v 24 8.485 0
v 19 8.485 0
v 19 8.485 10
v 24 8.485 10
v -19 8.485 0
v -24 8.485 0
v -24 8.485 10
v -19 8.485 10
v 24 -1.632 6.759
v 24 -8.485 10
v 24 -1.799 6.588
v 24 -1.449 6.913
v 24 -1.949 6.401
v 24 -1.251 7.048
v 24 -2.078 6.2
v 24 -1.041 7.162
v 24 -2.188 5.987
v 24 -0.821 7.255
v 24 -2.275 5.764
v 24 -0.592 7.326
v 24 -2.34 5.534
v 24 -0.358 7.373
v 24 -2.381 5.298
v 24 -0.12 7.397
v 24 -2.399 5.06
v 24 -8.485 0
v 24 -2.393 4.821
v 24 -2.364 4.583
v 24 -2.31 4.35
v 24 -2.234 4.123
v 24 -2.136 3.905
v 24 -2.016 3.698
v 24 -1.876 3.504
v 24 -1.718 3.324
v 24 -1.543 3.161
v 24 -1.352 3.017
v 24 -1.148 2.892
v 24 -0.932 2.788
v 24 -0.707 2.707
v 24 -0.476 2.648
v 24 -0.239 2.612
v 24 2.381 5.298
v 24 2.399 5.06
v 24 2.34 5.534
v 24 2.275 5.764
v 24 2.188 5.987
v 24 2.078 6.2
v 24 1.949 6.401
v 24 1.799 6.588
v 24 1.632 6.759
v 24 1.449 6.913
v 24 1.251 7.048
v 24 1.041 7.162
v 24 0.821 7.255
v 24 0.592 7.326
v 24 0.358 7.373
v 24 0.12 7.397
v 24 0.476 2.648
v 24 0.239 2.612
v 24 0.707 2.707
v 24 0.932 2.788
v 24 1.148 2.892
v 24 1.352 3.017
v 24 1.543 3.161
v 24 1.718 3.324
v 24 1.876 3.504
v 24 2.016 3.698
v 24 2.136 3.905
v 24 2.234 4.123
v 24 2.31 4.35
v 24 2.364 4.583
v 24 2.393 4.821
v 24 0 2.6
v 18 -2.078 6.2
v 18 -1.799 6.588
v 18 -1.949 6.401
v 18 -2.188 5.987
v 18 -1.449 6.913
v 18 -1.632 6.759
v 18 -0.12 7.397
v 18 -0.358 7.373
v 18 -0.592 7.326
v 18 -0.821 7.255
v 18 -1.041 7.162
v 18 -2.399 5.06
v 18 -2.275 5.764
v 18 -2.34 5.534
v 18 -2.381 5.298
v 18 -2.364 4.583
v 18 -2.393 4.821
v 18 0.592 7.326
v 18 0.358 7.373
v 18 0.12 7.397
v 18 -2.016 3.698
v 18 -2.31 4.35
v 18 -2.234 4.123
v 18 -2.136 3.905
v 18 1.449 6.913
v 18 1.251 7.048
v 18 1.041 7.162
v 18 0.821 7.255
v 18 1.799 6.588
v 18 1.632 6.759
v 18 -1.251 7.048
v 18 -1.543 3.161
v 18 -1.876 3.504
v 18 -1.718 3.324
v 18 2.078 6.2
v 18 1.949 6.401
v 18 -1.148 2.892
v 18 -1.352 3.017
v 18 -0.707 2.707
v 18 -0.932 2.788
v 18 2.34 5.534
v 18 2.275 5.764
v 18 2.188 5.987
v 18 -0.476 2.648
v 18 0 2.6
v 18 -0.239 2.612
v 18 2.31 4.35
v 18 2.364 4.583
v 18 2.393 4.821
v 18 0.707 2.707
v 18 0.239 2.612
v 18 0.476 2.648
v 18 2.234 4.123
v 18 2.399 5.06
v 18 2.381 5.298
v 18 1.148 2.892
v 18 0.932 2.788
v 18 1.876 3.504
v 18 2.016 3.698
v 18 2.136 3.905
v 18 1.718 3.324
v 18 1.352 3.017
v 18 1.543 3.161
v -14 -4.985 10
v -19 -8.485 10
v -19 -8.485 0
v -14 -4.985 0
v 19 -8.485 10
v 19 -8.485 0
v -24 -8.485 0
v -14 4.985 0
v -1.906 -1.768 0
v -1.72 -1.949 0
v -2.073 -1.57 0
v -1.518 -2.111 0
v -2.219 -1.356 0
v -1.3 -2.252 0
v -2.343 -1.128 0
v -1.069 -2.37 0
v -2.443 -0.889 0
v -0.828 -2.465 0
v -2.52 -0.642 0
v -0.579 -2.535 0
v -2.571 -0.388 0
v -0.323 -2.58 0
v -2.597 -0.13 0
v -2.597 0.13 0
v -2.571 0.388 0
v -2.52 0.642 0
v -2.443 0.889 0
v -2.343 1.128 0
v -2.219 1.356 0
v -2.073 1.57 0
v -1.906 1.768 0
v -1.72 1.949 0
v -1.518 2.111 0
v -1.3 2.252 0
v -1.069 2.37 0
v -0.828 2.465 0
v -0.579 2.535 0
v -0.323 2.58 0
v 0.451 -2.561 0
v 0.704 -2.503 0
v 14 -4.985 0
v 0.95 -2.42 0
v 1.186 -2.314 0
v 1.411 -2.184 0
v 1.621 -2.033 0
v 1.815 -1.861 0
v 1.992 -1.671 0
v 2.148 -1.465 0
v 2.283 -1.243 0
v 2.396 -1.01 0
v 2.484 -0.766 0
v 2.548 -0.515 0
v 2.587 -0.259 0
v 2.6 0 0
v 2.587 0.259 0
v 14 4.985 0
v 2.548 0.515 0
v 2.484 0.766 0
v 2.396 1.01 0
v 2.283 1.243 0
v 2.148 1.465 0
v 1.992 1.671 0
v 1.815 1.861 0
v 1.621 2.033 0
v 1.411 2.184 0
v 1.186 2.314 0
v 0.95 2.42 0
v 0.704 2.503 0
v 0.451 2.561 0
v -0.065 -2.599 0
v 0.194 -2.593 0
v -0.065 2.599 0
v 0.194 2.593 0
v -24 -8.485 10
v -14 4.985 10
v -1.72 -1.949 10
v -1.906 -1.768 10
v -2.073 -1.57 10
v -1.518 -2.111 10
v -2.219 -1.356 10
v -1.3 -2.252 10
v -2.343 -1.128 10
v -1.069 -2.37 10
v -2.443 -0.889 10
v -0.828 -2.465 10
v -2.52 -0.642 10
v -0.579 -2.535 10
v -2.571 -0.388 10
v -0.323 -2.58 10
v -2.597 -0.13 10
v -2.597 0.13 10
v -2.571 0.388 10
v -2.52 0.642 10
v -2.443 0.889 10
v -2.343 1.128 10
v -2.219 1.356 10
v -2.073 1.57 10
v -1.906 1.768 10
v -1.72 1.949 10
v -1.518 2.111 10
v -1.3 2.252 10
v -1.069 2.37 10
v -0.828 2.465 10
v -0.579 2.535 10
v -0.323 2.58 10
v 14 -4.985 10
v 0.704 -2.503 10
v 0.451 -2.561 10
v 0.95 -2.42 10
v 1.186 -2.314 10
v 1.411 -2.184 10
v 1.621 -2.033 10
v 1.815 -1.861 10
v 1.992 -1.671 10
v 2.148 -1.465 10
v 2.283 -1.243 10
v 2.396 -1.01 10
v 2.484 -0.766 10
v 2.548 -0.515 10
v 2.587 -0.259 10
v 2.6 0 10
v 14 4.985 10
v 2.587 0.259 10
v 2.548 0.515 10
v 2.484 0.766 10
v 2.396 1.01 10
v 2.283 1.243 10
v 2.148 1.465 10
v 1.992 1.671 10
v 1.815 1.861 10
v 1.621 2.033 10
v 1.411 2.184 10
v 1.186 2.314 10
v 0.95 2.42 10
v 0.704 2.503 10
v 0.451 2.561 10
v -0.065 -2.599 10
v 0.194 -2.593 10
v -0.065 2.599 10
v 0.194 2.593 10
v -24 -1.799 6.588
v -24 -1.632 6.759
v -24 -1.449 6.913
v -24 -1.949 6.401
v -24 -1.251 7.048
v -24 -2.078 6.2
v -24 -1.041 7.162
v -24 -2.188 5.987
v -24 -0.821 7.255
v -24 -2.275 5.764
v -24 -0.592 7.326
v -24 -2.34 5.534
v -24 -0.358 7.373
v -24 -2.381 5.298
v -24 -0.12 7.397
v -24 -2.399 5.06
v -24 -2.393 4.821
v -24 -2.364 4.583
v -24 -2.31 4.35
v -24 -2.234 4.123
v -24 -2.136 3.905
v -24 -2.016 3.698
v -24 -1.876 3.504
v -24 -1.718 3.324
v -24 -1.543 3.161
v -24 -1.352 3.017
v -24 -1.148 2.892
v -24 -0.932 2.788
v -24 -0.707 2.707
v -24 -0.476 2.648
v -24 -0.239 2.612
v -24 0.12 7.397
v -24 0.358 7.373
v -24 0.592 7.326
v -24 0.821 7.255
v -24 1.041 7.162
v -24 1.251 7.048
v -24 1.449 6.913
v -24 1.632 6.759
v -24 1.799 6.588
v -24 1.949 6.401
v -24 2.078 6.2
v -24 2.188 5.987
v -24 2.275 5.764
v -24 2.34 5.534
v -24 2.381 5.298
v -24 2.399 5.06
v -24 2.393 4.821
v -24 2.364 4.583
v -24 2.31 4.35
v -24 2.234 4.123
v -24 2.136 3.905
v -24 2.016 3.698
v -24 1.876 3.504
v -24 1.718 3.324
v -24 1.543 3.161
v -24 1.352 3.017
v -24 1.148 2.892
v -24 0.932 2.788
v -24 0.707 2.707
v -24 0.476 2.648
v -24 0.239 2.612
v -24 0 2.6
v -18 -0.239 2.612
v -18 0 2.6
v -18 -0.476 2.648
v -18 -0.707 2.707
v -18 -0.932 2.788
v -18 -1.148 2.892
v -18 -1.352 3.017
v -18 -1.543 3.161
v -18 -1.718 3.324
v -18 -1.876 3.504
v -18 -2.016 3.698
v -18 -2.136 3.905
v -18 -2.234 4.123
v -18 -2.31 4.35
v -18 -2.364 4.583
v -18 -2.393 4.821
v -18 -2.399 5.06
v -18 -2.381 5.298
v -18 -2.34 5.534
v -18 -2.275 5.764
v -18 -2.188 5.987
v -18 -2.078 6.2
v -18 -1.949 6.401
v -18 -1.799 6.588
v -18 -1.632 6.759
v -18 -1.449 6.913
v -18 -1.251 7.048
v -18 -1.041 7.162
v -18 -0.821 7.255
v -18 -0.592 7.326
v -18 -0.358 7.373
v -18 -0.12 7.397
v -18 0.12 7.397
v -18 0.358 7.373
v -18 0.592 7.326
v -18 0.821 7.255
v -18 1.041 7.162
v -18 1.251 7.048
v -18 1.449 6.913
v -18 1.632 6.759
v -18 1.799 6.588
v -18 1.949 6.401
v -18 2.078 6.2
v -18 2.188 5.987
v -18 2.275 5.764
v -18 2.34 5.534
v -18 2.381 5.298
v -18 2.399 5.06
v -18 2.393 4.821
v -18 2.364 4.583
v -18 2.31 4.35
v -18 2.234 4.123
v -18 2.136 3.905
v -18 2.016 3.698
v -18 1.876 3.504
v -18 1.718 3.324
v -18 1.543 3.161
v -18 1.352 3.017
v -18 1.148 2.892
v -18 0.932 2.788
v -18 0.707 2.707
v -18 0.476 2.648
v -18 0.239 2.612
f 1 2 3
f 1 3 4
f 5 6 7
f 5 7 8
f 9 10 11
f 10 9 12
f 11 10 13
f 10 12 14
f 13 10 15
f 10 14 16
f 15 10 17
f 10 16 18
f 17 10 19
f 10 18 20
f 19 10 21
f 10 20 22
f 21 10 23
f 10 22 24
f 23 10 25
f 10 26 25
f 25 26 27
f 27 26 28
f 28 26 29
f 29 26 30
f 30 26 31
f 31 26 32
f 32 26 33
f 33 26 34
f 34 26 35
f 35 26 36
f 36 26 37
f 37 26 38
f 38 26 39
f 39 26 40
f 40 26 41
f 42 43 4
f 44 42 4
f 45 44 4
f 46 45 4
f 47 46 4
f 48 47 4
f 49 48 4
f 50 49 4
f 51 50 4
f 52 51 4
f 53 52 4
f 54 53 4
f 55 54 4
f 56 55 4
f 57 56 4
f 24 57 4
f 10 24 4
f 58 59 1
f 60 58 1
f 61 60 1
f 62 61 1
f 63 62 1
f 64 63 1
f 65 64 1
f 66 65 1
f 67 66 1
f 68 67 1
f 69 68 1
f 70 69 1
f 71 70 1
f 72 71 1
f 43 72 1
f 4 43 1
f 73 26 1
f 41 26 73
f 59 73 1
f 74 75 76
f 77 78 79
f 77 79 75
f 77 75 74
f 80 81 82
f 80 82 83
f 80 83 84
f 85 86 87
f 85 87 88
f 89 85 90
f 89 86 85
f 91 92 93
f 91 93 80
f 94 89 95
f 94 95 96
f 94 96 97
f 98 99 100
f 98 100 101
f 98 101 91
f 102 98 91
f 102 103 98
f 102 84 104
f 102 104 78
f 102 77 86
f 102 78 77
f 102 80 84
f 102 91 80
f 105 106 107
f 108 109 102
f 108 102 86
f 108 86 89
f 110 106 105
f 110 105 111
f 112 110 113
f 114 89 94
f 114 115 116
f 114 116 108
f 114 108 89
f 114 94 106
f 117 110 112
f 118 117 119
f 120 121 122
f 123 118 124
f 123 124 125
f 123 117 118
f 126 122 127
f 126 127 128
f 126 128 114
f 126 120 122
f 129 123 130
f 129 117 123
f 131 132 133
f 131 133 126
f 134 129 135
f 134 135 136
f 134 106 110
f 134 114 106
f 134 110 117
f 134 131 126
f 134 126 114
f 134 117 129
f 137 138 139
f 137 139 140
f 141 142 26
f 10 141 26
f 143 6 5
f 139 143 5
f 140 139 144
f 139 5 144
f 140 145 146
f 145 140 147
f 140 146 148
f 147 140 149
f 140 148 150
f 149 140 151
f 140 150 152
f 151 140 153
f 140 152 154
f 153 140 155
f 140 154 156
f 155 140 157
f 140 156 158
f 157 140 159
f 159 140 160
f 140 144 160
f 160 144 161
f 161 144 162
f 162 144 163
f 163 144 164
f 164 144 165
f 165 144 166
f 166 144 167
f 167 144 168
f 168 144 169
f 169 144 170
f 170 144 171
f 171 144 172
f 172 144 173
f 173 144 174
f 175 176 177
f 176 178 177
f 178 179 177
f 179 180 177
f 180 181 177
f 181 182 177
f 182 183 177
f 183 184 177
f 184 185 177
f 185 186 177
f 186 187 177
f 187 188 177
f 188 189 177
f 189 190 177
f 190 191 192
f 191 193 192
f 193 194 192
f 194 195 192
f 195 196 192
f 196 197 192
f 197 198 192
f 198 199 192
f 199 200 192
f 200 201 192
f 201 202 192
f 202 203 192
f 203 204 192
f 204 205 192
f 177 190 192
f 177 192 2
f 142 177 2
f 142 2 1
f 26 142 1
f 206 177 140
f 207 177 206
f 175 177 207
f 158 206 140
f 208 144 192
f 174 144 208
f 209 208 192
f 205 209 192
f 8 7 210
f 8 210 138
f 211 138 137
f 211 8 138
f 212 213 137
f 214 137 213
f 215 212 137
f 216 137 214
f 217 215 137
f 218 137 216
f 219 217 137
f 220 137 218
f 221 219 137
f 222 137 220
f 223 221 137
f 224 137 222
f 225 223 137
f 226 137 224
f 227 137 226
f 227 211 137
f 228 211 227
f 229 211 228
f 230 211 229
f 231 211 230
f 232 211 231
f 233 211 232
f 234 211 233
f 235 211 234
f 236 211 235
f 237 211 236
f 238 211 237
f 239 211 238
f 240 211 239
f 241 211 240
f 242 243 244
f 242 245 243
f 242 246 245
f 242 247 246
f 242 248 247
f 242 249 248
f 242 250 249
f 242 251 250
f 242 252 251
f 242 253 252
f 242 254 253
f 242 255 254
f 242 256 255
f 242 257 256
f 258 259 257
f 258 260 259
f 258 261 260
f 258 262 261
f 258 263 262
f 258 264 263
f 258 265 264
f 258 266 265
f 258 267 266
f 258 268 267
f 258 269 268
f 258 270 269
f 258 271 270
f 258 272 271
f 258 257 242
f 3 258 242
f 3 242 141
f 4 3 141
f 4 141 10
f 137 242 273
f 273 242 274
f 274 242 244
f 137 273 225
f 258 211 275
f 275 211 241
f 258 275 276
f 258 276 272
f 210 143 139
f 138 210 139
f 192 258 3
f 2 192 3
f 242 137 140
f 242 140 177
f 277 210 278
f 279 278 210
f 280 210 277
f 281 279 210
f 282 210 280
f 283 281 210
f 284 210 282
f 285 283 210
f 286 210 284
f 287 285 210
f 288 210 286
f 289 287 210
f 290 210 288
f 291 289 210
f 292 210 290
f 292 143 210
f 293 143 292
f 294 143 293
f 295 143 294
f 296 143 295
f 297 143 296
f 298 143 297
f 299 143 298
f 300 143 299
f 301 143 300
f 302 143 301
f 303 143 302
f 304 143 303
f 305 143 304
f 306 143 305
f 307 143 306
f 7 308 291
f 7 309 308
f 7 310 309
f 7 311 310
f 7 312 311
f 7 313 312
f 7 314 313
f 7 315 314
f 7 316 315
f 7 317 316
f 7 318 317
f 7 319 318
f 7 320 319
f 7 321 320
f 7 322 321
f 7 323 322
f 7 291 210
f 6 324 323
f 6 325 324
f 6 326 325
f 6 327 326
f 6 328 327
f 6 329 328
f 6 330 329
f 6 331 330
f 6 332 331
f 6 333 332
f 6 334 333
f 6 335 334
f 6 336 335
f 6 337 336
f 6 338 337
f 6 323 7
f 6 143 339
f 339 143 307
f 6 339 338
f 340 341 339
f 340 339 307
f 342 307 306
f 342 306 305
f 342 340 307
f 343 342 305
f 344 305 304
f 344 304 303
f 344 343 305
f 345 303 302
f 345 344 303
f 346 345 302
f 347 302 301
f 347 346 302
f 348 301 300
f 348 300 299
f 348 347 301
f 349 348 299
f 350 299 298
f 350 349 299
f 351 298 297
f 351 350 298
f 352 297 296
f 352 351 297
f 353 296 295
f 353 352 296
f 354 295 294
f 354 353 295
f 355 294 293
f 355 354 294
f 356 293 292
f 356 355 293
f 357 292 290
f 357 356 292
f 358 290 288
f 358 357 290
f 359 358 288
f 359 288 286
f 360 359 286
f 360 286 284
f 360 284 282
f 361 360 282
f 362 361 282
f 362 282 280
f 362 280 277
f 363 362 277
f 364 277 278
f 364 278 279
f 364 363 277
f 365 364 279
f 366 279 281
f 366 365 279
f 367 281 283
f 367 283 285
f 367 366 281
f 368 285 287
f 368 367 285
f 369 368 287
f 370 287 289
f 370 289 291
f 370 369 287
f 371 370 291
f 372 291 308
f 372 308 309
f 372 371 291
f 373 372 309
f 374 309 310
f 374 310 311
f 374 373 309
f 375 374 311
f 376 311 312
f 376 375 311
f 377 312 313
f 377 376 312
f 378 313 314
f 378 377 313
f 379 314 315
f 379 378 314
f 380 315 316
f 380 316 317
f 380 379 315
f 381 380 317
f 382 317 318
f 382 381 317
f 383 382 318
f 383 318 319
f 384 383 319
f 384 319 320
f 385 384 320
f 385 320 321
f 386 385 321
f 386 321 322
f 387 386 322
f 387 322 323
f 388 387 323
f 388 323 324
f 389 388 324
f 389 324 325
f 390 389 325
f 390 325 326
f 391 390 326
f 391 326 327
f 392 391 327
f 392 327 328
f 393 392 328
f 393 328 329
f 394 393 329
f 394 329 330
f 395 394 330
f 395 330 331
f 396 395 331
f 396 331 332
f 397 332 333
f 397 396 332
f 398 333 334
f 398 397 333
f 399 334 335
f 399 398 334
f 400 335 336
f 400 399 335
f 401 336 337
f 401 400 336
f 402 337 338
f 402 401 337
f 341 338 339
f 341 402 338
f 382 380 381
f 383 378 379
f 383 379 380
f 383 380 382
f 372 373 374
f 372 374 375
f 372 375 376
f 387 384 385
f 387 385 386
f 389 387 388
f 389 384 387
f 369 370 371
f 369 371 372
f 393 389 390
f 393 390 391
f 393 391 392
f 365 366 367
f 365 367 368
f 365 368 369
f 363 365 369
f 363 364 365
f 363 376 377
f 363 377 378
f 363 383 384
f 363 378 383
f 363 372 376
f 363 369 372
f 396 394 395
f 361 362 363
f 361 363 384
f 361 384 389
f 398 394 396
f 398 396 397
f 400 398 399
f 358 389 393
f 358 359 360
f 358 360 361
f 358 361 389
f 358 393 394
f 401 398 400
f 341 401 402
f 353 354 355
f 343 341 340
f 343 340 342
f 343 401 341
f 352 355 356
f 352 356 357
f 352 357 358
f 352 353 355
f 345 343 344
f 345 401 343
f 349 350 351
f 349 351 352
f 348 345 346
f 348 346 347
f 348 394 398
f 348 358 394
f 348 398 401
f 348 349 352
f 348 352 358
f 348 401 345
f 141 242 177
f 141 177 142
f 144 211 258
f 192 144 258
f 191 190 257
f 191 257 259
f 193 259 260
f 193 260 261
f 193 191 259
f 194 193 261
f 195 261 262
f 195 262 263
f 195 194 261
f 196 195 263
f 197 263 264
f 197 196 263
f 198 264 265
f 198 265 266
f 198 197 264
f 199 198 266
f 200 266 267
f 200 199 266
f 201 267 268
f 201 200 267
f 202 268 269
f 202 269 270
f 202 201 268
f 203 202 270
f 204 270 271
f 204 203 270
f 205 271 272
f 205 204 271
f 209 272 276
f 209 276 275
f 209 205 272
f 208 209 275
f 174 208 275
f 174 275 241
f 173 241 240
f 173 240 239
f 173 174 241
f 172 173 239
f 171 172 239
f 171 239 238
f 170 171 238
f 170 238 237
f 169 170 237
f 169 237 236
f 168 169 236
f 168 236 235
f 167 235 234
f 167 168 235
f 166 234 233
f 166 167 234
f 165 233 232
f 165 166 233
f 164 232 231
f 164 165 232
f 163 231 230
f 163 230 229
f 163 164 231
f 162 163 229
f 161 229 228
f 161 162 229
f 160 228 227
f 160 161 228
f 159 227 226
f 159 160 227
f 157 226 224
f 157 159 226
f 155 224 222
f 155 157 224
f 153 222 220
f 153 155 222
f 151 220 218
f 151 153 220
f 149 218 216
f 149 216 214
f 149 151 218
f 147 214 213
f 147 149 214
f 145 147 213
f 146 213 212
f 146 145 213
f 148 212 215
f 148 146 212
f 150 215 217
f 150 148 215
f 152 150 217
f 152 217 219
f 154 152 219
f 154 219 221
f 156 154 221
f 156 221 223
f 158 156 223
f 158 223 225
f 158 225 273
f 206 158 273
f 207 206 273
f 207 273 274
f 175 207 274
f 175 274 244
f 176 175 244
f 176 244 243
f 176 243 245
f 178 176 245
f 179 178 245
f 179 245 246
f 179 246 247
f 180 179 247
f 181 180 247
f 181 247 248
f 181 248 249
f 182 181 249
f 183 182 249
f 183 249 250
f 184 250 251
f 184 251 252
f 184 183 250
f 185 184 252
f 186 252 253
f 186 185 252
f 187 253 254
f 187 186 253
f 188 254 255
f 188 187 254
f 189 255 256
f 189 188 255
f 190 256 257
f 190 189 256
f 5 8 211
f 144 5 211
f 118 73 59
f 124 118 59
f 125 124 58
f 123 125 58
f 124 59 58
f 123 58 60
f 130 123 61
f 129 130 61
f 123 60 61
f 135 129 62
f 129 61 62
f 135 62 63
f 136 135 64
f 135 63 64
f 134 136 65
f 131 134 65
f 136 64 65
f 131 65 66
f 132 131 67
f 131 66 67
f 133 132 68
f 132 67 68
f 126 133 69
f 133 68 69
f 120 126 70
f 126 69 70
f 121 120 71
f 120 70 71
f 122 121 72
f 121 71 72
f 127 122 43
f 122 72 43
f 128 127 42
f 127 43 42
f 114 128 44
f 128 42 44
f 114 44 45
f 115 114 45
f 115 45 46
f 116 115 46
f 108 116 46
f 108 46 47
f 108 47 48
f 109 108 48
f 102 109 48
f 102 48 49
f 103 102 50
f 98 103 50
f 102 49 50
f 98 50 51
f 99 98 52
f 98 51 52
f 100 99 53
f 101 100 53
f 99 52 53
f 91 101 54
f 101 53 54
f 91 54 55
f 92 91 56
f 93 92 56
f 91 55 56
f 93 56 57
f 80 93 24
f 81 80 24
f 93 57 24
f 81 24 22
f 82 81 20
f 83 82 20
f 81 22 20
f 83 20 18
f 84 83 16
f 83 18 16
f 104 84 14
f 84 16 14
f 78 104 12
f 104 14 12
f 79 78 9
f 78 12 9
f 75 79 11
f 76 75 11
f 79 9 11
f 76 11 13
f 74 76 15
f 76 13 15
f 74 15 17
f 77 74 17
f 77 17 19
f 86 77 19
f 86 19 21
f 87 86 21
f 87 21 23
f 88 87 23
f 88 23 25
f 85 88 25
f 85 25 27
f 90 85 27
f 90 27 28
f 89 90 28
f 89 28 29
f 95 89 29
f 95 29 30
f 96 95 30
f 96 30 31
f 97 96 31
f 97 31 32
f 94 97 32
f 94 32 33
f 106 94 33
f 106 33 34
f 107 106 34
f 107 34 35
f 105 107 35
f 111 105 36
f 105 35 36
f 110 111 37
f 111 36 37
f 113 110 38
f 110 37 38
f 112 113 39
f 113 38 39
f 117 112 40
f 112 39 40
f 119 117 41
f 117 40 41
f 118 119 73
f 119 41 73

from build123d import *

# Parameters (mm, degrees)
SKETCH_1_W          = 48
SKETCH_1_H          = 16.97
SKETCH_1_R          = 2.6
EXTRUDE_1_DEPTH     = 10
SKETCH_3_R          = 2.4
CUT_EXTRUDE_1_DEPTH = 6
CUT_EXTRUDE_START   = -6
SKETCH_4_R          = 2.4
CUT_EXTRUDE_2_DEPTH = 6
CUT_EXTRUDE_3_DEPTH = 28.349501367


with BuildPart() as part:
    # ｽｹｯﾁ1 → ﾎﾞｽ - 押し出し1 (new body)
    with BuildSketch(Plane.XY):
        Rectangle(SKETCH_1_W, SKETCH_1_H)
        Circle(SKETCH_1_R, mode=Mode.SUBTRACT)
    extrude(amount=EXTRUDE_1_DEPTH)

    # ｽｹｯﾁ3 → ｶｯﾄ - 押し出し1 (cut)
    with BuildSketch(Plane(origin=(24, 0, 0), x_dir=(0, 0, -1), z_dir=(1, 0, 0))):
        with Locations((-5, 0)):
            Circle(SKETCH_3_R)
    extrude(amount=-CUT_EXTRUDE_1_DEPTH, mode=Mode.SUBTRACT)

    # ｽｹｯﾁ4 → ｶｯﾄ - 押し出し2 (cut)
    with BuildSketch(Plane.ZY.offset(24).offset(CUT_EXTRUDE_START)):
        with Locations(Location((5, 0, 0), (0, 0, 180))):
            Circle(SKETCH_4_R)
    extrude(amount=CUT_EXTRUDE_2_DEPTH, mode=Mode.SUBTRACT)

    # ｽｹｯﾁ5 → ｶｯﾄ - 押し出し3 (cut, through all)
    with BuildSketch(Plane.XY.offset(10)):
        Polygon((-14, 4.985), (14, 4.985), (19, 8.485), (-19, 8.485), align=None)
        Polygon((-14, -4.985), (14, -4.985), (19, -8.485), (-19, -8.485), align=None)
    extrude(amount=-CUT_EXTRUDE_3_DEPTH, mode=Mode.SUBTRACT)


solid = part.part
